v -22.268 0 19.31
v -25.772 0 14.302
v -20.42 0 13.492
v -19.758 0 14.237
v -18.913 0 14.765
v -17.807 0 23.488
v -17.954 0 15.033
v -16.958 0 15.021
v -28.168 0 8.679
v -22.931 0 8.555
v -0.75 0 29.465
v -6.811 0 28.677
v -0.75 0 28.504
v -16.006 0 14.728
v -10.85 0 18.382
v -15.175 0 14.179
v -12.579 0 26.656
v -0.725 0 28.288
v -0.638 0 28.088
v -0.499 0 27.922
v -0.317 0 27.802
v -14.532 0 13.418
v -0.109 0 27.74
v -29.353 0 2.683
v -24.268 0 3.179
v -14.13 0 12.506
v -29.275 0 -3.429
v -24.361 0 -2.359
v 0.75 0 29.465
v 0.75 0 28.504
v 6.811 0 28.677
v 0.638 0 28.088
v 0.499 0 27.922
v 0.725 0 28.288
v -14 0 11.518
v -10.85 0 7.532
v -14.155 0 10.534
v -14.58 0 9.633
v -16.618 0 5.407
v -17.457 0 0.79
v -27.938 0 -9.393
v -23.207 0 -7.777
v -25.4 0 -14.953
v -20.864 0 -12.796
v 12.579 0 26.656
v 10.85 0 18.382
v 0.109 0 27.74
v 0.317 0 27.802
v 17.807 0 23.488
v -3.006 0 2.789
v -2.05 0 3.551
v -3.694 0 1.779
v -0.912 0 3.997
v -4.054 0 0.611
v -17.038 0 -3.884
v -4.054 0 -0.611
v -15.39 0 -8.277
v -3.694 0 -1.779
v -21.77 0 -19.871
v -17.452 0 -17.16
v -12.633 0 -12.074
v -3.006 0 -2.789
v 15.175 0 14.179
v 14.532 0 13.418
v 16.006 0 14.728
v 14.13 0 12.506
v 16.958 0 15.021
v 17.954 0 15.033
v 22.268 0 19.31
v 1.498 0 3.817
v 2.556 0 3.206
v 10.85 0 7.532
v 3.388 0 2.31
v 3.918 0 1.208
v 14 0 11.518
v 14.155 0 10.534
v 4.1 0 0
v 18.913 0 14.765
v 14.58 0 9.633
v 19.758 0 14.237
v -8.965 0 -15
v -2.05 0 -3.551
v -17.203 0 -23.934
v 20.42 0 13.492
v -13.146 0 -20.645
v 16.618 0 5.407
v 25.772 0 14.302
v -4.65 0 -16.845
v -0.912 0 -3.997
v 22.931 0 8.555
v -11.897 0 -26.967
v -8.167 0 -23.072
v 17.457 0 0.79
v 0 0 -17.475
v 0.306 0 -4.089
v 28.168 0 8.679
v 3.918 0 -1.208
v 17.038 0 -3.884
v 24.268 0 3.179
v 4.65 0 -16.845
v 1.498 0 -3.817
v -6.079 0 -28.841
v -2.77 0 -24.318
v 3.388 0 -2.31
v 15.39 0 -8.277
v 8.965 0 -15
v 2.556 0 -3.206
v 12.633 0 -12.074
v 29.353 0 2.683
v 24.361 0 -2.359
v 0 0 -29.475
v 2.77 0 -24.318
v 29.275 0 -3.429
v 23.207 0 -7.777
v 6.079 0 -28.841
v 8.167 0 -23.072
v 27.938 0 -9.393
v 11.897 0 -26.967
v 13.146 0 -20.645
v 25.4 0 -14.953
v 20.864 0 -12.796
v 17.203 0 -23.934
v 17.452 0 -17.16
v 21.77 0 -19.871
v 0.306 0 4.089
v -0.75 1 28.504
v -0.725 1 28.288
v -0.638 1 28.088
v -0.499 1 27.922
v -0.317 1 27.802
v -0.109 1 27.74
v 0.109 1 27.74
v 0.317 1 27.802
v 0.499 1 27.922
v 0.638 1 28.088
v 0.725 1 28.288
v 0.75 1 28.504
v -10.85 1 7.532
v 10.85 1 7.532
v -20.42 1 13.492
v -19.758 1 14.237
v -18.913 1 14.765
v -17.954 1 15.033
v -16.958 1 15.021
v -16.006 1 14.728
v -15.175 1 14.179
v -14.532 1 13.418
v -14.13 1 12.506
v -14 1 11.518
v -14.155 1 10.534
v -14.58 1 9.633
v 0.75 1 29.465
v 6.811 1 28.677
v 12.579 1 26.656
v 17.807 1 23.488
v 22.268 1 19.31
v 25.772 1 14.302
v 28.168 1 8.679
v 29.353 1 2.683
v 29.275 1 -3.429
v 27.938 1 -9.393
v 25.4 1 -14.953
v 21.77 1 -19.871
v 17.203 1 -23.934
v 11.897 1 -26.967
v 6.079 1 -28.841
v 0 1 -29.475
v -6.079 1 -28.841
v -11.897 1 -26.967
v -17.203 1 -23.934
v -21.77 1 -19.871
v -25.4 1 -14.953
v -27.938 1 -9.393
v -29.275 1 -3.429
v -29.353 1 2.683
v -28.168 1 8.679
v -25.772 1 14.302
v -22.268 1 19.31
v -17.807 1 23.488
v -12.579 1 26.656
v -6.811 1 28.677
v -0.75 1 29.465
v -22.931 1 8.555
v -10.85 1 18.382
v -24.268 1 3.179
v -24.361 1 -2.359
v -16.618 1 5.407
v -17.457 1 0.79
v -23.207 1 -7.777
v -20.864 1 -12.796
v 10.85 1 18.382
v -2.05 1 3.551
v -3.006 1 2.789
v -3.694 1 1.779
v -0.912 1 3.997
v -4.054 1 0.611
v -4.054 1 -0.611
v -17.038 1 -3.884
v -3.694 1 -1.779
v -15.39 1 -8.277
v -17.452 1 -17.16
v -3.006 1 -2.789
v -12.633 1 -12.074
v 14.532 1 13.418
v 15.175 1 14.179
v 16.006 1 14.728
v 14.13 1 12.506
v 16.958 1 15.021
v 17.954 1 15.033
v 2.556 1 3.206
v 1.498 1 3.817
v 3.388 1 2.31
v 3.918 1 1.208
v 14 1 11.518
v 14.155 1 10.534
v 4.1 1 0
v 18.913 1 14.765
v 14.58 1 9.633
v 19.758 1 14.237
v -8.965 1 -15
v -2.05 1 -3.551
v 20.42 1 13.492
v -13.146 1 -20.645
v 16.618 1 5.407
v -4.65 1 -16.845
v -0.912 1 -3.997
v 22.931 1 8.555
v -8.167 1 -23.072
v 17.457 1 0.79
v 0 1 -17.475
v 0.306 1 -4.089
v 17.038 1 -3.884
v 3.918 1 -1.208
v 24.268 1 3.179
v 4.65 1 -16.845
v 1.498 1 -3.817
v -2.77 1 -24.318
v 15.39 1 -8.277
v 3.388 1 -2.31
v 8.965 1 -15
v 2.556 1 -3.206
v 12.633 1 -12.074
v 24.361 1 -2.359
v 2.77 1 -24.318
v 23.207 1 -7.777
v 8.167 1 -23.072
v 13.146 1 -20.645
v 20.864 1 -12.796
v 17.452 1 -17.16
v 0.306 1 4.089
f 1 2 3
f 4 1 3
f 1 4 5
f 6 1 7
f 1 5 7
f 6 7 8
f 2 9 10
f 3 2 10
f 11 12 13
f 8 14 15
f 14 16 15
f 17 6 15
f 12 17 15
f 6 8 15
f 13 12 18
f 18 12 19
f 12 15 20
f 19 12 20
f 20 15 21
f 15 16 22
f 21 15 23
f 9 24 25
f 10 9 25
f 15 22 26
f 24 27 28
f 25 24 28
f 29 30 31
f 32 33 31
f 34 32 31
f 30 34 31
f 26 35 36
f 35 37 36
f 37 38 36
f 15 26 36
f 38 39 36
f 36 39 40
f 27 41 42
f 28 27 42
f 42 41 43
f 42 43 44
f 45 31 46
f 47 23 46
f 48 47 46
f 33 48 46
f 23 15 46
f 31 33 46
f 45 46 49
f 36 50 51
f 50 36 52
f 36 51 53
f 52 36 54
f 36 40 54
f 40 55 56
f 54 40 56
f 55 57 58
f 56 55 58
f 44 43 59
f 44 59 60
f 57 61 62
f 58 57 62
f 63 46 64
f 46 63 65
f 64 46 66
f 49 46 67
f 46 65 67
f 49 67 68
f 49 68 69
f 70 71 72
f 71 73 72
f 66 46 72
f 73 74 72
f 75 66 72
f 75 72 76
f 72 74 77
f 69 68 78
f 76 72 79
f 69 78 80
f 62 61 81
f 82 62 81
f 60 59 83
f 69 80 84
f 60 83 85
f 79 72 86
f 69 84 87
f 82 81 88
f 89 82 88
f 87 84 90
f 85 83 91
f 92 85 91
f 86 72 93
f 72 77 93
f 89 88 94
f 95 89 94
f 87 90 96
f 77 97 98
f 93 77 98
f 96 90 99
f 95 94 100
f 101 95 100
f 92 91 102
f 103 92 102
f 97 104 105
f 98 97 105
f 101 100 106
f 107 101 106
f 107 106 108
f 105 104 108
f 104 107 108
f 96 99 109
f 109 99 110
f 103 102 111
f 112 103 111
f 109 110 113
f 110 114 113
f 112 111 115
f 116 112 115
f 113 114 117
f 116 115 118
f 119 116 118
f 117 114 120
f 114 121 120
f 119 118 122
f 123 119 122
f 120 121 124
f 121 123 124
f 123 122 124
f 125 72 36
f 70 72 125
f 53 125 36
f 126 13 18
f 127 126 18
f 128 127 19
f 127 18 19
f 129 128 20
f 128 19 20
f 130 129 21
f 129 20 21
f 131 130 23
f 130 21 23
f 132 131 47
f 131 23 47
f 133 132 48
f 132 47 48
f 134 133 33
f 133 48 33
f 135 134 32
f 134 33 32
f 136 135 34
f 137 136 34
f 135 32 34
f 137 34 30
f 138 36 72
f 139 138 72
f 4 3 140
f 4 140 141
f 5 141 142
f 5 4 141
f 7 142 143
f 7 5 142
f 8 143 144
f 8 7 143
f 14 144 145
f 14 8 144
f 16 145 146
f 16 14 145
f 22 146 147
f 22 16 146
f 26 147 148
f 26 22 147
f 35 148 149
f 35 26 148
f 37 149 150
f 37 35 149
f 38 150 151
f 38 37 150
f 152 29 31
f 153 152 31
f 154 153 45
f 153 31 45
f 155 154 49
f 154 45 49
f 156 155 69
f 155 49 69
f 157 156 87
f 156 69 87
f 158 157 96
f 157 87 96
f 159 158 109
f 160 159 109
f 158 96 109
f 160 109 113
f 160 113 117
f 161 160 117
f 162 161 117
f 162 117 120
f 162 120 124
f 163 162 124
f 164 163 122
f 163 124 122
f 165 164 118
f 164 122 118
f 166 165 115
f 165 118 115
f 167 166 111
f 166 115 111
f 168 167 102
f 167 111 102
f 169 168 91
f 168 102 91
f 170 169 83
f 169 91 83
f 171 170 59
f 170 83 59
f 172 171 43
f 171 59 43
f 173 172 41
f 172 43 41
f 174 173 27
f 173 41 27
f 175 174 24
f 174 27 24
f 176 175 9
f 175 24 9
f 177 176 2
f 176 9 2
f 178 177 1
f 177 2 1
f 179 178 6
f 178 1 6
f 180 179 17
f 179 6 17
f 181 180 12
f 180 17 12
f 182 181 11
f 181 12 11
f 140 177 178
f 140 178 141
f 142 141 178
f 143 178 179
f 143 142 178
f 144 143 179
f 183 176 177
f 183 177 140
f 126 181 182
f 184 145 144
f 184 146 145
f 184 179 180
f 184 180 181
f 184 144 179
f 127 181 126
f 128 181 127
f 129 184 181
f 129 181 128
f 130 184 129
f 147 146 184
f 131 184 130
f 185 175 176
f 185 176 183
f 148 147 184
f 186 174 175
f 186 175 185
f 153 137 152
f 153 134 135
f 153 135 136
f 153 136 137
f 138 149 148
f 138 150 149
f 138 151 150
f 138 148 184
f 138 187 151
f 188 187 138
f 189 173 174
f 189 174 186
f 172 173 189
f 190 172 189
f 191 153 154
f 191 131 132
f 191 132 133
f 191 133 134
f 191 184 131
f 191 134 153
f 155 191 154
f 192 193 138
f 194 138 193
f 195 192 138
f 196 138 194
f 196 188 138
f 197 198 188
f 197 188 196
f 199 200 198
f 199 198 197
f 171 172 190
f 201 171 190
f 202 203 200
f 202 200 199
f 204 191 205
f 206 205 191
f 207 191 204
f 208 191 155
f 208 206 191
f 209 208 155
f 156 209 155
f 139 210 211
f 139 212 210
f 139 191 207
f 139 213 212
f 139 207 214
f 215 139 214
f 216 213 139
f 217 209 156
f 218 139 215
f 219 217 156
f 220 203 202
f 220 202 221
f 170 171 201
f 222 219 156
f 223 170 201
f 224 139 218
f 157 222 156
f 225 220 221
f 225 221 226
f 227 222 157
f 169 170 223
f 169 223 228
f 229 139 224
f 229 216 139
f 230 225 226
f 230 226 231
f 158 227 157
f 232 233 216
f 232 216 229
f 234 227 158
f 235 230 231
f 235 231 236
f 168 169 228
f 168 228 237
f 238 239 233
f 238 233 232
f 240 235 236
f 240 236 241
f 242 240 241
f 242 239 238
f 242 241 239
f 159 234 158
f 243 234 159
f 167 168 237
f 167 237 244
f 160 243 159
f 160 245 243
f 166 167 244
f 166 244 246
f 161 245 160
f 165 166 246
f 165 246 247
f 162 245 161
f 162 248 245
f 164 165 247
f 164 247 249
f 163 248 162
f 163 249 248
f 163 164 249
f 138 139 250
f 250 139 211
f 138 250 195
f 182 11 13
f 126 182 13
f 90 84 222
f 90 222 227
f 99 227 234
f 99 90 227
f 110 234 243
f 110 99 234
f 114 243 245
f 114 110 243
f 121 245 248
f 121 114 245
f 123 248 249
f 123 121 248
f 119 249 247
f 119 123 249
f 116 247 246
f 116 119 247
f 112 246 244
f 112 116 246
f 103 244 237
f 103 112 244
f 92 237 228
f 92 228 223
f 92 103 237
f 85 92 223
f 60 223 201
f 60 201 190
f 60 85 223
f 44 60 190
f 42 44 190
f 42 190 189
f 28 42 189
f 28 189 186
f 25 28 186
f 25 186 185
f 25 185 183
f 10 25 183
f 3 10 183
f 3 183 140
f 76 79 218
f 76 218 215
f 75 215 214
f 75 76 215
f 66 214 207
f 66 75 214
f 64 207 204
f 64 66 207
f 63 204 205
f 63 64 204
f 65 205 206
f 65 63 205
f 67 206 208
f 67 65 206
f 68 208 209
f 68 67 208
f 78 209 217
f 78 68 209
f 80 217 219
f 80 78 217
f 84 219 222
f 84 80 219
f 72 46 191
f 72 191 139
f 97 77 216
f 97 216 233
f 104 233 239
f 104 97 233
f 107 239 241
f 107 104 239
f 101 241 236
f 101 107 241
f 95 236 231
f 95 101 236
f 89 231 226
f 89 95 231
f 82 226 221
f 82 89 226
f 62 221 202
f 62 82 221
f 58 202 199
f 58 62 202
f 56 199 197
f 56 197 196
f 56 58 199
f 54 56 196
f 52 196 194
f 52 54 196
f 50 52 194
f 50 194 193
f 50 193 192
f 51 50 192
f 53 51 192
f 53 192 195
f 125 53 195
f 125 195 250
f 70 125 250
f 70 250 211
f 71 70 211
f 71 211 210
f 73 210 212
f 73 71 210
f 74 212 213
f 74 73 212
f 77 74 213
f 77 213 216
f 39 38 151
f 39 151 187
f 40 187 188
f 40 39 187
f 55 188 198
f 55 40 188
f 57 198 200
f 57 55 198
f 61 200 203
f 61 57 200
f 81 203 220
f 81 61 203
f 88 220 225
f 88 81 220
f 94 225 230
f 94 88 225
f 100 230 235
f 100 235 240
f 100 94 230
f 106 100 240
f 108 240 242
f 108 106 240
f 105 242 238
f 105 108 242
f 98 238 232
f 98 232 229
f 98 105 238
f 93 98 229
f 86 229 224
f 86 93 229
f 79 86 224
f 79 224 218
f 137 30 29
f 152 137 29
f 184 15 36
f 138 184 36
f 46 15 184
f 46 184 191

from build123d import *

# Parameters (mm, degrees)
SKETCH_1_R      = 4.1
SKETCH_1_W      = 21.7
SKETCH_1_H      = 10.85
EXTRUDE_1_DEPTH = 1


with BuildPart() as part:
    # Эскиз1 → Бобышка-Вытянуть1 (new body)
    with BuildSketch(Plane(origin=(0, 0, 0), x_dir=(1, 0, 0), z_dir=(0, 1, 0))):
        with BuildLine():
            Line((0.75, -28.503654365), (0.75, -29.46545647))
            ThreePointArc((0.75, -29.46545647), (0, 29.475), (-0.75, -29.46545647))
            Line((-0.75, -29.46545647), (-0.75, -28.503654365))
            ThreePointArc((-0.75, -28.503654365), (0, -27.732186207), (0.75, -28.503654365))
        make_face()
        Circle(SKETCH_1_R, mode=Mode.SUBTRACT)
        with Locations((0, -12.957484911)):
            Rectangle(SKETCH_1_W, SKETCH_1_H, mode=Mode.SUBTRACT)
        with BuildLine():
            ThreePointArc((20.420143027, -13.492345376), (0, 24.475), (-20.420143027, -13.492345376))
            ThreePointArc((-20.420143027, -13.492345376), (-15.570553266, -14.483041669), (-14.579856973, -9.633451908))
            ThreePointArc((-14.579856973, -9.633451908), (0, 17.475), (14.579856973, -9.633451908))
            ThreePointArc((14.579856973, -9.633451908), (15.570553266, -14.483041669), (20.420143027, -13.492345376))
        make_face(mode=Mode.SUBTRACT)
    extrude(amount=EXTRUDE_1_DEPTH)


solid = part.part
